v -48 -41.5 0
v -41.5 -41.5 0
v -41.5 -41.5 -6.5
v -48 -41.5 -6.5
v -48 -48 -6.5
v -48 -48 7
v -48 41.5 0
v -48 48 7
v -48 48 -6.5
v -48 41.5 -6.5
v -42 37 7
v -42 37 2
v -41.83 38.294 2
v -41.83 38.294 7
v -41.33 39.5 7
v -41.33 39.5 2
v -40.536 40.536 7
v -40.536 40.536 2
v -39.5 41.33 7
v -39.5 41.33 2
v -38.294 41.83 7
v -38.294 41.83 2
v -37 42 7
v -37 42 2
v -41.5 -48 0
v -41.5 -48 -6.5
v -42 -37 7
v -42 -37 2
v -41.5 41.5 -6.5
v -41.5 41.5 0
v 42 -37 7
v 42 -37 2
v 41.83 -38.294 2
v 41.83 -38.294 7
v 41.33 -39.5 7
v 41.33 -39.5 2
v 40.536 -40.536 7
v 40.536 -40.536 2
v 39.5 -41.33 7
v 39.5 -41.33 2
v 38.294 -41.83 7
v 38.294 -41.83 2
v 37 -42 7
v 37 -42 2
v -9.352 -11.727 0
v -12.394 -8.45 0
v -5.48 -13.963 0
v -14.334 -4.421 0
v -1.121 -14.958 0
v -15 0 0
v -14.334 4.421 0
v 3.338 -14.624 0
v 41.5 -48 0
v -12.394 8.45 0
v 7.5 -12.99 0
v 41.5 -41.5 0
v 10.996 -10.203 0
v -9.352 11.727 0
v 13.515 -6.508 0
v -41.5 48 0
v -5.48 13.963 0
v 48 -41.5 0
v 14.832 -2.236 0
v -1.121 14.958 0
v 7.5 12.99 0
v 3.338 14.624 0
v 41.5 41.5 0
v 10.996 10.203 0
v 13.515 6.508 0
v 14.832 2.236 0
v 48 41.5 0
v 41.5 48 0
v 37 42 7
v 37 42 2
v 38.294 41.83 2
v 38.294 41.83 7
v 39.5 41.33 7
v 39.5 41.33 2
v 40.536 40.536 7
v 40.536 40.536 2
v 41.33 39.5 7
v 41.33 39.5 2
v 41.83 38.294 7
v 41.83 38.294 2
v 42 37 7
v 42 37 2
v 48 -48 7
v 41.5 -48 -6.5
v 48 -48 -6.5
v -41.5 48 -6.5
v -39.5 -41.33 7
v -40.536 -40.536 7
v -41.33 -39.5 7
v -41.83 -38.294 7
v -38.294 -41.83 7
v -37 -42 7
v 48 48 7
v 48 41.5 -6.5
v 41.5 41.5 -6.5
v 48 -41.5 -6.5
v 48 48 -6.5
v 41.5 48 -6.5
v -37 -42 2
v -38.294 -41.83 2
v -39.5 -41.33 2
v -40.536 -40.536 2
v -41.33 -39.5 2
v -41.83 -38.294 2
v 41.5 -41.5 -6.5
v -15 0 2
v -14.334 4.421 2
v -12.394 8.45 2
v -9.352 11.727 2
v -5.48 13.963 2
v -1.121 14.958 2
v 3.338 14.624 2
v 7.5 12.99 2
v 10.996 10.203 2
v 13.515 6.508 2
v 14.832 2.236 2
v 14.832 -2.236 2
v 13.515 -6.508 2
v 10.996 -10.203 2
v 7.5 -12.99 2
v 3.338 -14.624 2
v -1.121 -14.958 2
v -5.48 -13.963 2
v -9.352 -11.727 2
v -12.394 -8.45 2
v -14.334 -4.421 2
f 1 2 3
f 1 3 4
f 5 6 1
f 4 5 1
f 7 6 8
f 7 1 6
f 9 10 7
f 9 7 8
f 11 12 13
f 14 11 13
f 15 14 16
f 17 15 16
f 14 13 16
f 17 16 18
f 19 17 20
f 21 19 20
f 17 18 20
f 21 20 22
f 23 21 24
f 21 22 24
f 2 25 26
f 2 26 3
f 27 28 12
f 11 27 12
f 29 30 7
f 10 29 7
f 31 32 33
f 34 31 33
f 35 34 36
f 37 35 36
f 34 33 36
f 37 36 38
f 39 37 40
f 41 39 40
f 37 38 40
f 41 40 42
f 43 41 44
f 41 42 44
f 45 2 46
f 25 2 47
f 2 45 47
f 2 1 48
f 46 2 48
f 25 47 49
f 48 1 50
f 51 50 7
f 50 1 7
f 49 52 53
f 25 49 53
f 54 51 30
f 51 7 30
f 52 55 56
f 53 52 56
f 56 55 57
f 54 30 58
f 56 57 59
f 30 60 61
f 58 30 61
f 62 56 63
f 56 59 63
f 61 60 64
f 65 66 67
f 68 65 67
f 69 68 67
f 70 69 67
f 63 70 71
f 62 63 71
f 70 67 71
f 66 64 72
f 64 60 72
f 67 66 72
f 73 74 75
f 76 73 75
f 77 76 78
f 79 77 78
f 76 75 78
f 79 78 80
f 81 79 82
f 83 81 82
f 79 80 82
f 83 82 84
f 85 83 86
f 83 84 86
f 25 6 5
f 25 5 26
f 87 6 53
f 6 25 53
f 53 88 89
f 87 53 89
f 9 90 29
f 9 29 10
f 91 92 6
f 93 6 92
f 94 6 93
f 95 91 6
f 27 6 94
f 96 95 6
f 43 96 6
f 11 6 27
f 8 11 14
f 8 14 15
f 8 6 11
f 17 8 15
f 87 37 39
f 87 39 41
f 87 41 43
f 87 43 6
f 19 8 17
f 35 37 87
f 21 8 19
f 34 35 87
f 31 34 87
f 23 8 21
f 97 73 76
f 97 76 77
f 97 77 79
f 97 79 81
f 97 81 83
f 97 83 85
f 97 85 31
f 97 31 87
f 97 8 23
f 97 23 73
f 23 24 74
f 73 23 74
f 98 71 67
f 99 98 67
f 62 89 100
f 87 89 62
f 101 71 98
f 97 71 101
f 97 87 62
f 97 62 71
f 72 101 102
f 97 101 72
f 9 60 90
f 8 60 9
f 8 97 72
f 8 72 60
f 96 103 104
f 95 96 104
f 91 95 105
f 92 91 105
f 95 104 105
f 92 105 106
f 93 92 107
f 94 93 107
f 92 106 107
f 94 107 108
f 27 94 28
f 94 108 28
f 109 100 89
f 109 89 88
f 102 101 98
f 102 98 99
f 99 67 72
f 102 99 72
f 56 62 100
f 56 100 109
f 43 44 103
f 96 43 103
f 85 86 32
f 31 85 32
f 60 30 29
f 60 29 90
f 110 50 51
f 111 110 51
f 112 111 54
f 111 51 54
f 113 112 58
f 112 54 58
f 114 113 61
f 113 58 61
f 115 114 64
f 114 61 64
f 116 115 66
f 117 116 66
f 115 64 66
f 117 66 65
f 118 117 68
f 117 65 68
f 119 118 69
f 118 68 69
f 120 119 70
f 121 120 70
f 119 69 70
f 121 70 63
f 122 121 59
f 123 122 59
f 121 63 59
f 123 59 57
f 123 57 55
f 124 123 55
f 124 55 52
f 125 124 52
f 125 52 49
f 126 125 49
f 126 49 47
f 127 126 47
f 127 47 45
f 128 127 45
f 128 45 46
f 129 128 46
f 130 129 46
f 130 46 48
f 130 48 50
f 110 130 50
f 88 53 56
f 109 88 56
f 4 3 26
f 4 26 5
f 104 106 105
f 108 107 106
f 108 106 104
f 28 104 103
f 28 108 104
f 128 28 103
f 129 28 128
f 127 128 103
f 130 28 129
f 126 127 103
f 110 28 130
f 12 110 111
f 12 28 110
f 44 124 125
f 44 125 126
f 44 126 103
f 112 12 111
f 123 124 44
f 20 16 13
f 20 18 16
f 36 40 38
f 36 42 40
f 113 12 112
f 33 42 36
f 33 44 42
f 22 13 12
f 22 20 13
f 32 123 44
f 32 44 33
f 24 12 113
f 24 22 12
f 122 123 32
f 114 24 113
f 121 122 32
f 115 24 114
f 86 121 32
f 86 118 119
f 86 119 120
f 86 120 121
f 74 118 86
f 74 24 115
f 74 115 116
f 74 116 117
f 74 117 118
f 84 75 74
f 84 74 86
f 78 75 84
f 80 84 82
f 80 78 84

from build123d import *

# Parameters (mm, degrees)
SKETCH1_W           = 96
SKETCH1_H           = 96
BOSS_EXTRUDE1_DEPTH = 2
SKETCH2_W           = 96
SKETCH2_H           = 96
BOSS_EXTRUDE2_DEPTH = 5
SKETCH3_W           = 6.5
SKETCH3_H           = 6.5
BOSS_EXTRUDE3_DEPTH = 6.5
SKETCH5_R           = 15
CUT_EXTRUDE1_DEPTH  = 10


with BuildPart() as part:
    # Sketch1 → Boss-Extrude1 (new body)
    with BuildSketch(Plane.XY):
        Rectangle(SKETCH1_W, SKETCH1_H)
    extrude(amount=BOSS_EXTRUDE1_DEPTH)

    # Sketch2 → Boss-Extrude2 (add)
    with BuildSketch(Plane.XY.offset(2)):
        Rectangle(SKETCH2_W, SKETCH2_H)
        with BuildLine():
            Line((37, -42), (-37, -42))
            ThreePointArc((-37, -42), (-40.535533906, -40.535533906), (-42, -37))
            Line((-42, -37), (-42, 37))
            ThreePointArc((-42, 37), (-40.535533906, 40.535533906), (-37, 42))
            Line((-37, 42), (37, 42))
            ThreePointArc((37, 42), (40.535533906, 40.535533906), (42, 37))
            Line((42, 37), (42, -37))
            ThreePointArc((42, -37), (40.535533906, -40.535533906), (37, -42))
        make_face(mode=Mode.SUBTRACT)
    extrude(amount=BOSS_EXTRUDE2_DEPTH)

    # Sketch3 → Boss-Extrude3 (add)
    with BuildSketch(Plane(origin=(0, 0, 0), x_dir=(-1, 0, 0), z_dir=(0, 0, -1))):
        with Locations((-44.75, 44.75)):
            Rectangle(SKETCH3_W, SKETCH3_H)
        with Locations((44.75, 44.75)):
            Rectangle(SKETCH3_W, SKETCH3_H)
        with Locations((-44.75, -44.75)):
            Rectangle(SKETCH3_W, SKETCH3_H)
        with Locations((44.75, -44.75)):
            Rectangle(SKETCH3_W, SKETCH3_H)
    extrude(amount=BOSS_EXTRUDE3_DEPTH)

    # Sketch5 → Cut-Extrude1 (cut)
    with BuildSketch(Plane(origin=(0, 0, 0), x_dir=(-1, 0, 0), z_dir=(0, 0, -1))):
        Circle(SKETCH5_R)
    extrude(amount=-CUT_EXTRUDE1_DEPTH, mode=Mode.SUBTRACT)


solid = part.part
